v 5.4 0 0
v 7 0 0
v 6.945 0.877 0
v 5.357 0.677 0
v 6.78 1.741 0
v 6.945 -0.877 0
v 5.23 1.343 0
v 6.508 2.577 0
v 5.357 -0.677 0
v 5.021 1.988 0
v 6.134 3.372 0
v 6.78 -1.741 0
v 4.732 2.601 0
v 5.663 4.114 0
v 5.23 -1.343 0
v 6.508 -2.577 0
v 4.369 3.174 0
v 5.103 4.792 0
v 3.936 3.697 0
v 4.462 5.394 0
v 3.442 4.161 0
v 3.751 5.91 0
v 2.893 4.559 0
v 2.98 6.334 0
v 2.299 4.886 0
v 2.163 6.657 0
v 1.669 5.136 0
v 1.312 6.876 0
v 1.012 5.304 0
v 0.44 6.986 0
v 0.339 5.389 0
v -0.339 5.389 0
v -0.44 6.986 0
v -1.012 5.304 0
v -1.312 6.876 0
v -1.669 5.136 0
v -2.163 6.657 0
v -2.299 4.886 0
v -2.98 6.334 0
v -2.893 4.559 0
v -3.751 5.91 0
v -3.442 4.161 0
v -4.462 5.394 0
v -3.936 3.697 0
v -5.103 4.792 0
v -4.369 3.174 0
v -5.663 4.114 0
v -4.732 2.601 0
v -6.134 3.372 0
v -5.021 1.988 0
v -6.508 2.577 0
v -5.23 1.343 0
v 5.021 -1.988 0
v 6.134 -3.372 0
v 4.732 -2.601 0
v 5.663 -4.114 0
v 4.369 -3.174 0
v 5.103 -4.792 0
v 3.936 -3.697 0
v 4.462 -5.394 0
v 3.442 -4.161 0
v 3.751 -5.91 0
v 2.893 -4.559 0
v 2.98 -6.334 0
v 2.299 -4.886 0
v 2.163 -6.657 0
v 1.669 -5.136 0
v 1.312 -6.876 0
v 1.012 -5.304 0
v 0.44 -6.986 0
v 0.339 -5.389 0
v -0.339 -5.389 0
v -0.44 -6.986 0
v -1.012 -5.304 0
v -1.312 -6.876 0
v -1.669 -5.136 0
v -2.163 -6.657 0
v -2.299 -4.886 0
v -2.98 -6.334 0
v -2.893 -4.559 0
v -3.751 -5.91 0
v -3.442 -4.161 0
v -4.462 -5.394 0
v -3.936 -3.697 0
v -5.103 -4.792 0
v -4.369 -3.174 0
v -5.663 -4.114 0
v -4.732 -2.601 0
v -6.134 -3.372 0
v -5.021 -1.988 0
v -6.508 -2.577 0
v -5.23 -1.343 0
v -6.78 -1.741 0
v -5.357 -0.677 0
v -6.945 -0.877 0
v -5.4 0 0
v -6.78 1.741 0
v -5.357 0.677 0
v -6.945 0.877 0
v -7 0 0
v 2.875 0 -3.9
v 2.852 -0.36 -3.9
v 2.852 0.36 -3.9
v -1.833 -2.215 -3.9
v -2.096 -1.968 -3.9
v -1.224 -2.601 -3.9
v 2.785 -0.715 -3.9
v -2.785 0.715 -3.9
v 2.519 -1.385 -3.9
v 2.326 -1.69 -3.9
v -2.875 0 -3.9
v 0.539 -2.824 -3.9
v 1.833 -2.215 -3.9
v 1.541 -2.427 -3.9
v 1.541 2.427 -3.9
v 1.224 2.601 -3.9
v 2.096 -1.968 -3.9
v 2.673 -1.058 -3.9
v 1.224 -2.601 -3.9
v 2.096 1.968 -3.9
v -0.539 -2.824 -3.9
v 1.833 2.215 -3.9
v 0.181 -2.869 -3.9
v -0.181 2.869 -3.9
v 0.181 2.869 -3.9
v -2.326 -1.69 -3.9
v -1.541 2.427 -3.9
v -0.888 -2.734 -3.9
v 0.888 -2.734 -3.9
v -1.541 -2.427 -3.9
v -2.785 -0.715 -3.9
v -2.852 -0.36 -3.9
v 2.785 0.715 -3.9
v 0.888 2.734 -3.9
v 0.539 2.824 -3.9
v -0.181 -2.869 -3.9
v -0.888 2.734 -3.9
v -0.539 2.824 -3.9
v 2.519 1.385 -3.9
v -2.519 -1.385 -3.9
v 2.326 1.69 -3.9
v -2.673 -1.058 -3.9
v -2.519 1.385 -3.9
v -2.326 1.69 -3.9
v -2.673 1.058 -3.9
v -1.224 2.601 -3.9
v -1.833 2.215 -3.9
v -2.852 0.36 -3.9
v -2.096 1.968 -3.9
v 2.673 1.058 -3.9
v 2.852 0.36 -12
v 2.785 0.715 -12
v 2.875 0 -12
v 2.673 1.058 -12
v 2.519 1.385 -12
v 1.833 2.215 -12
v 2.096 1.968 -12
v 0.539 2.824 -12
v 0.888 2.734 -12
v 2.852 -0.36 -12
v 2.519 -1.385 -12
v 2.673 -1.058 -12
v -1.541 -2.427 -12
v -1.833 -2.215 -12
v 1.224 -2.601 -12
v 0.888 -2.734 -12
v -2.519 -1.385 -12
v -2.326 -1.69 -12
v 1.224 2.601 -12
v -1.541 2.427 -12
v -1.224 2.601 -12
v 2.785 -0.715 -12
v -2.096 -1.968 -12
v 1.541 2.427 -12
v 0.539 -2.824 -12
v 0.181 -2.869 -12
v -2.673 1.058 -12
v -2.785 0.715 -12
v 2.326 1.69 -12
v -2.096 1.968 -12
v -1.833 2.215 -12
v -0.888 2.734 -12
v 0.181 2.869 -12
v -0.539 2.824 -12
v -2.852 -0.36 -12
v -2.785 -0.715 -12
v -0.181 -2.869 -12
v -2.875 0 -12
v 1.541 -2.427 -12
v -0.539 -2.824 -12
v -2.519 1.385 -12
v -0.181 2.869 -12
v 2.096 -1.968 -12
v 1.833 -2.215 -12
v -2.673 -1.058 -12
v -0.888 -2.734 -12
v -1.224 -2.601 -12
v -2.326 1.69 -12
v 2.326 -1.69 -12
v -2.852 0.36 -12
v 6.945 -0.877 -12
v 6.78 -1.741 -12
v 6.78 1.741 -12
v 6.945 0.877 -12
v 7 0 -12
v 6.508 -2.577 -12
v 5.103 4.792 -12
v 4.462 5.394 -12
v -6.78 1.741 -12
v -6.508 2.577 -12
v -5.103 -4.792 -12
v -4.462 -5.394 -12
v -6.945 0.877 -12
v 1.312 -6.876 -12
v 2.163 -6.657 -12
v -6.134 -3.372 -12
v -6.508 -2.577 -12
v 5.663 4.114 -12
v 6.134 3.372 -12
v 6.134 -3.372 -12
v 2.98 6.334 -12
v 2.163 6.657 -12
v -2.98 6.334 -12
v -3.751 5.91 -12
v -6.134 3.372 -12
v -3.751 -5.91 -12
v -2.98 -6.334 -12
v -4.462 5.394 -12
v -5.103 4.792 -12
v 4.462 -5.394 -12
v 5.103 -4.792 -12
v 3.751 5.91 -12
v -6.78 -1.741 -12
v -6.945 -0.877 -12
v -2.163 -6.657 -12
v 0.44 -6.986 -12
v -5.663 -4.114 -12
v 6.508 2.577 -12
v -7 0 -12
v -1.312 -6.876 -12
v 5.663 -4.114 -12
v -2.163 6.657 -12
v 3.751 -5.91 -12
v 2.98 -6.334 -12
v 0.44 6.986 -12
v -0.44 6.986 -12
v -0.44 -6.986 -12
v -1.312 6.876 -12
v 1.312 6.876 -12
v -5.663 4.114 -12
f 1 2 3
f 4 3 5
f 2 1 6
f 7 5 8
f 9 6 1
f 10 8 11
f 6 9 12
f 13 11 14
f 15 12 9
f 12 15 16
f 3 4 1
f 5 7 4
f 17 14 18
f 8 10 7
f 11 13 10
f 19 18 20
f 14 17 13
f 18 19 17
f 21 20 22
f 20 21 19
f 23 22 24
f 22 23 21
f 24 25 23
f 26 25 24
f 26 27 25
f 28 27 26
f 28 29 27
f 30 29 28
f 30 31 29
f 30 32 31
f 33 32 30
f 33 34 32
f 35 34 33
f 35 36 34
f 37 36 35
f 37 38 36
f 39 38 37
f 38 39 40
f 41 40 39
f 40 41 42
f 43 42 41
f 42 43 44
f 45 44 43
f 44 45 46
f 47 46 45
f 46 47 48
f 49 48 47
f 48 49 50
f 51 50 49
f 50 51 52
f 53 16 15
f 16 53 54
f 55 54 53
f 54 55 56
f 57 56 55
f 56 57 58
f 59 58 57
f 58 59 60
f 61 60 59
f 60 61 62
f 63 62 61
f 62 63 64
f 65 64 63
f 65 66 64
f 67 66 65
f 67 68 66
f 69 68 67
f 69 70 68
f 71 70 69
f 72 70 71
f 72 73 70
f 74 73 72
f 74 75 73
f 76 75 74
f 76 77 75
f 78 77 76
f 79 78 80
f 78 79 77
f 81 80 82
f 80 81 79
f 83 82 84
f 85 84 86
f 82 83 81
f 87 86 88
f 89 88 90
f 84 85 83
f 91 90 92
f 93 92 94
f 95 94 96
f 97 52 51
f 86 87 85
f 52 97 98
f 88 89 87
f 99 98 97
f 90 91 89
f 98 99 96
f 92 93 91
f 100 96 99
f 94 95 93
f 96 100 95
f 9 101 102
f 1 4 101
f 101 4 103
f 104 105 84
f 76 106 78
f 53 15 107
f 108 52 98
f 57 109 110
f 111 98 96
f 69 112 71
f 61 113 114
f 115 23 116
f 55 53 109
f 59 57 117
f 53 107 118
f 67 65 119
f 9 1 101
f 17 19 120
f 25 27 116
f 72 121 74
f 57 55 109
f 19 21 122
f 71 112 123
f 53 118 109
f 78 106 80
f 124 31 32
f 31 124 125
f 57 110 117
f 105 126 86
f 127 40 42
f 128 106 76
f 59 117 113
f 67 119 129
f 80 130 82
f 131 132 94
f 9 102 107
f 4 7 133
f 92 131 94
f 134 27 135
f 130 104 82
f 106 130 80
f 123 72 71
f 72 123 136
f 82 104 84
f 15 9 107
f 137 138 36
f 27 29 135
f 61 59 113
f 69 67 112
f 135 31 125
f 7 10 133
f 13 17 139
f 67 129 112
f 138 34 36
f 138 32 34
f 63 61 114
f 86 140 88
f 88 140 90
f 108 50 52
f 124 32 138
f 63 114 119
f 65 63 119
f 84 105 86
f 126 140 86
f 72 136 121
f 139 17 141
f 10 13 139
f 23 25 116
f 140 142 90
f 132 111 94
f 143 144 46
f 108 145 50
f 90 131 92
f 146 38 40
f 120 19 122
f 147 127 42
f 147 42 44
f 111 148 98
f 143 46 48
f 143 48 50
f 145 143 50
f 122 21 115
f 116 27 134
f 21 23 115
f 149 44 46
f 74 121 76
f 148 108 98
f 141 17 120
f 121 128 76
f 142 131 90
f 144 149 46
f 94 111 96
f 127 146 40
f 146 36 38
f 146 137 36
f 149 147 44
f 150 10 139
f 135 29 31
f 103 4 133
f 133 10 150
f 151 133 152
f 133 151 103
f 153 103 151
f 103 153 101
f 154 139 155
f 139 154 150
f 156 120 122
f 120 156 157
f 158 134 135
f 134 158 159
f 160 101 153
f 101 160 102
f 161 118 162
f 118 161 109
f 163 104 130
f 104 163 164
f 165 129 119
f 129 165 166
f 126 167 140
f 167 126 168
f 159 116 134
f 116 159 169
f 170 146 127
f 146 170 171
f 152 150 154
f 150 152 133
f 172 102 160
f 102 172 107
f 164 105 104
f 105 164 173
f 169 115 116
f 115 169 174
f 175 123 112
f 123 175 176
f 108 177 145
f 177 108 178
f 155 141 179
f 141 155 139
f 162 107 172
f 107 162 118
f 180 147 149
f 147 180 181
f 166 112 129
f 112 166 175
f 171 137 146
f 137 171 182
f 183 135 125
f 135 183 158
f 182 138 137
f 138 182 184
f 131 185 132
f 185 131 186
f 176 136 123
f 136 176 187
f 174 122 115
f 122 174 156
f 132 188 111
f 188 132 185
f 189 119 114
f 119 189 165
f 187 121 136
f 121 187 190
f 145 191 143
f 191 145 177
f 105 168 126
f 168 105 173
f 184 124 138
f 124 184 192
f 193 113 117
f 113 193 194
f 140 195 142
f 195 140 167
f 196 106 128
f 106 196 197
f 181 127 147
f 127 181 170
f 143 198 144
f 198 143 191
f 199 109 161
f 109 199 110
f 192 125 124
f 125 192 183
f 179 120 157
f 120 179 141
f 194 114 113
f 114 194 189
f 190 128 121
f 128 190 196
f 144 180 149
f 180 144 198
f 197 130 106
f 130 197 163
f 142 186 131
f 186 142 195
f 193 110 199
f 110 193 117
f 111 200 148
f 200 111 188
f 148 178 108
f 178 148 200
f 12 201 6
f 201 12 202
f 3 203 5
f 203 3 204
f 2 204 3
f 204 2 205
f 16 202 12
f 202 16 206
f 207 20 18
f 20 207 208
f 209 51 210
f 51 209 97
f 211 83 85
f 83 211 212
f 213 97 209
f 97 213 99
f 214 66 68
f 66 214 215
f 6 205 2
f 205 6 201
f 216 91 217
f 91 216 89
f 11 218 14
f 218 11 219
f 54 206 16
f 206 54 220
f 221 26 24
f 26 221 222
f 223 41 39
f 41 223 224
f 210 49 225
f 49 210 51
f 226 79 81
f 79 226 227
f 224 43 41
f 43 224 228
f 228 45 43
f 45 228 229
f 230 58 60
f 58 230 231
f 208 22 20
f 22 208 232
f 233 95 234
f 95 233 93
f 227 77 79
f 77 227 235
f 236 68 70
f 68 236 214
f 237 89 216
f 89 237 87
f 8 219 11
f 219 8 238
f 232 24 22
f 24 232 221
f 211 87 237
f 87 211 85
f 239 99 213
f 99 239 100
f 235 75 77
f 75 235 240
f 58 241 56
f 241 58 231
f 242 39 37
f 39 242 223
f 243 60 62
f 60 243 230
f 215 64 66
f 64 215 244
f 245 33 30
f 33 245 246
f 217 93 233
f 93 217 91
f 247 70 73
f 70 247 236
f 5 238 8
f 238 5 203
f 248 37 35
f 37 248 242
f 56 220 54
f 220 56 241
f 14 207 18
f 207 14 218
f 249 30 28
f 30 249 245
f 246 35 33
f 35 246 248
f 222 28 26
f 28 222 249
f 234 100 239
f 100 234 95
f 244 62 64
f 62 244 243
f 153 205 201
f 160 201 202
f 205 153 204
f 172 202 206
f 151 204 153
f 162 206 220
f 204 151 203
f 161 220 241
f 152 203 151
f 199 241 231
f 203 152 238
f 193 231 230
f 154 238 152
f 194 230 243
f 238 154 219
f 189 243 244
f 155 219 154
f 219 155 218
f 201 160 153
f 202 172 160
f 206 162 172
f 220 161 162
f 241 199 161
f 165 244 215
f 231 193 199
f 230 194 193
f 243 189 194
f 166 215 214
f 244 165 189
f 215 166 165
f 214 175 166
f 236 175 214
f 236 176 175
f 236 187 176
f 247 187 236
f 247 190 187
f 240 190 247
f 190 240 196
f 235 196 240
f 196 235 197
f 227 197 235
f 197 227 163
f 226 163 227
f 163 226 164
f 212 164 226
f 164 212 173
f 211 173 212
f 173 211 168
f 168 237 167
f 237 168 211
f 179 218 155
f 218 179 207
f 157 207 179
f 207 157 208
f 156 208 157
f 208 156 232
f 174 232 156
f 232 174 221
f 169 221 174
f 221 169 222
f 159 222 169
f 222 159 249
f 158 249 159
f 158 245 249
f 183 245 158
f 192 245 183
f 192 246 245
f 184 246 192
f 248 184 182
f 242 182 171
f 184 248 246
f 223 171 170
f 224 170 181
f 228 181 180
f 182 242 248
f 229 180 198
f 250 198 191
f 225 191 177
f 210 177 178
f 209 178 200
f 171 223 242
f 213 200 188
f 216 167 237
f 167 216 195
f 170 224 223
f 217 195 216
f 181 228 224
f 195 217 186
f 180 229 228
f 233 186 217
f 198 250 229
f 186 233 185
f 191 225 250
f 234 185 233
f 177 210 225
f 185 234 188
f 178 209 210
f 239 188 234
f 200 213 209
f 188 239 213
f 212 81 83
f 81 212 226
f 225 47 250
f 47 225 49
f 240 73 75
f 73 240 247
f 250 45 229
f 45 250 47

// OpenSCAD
$fn = 50;

difference() {
	union() {
		translate(v = [0, 0, -12.0]) {
			cylinder(h = 12, r = 7.0);
		}
	}
	union() {
		translate(v = [0, 0, 0]) {
			rotate(a = [0, 0, 0]) {
				difference() {
					union() {
						translate(v = [0, 0, -15.0]) {
							cylinder(h = 15, r = 2.6);
						}
						translate(v = [0, 0, -3.9]) {
							cylinder(h = 3.9, r1 = 2.875, r2 = 5.4);
						}
						translate(v = [0, 0, -15.0]) {
							cylinder(h = 15, r = 2.875);
						}
						translate(v = [0, 0, -15.0]) {
							cylinder(h = 15, r = 2.6);
						}
					}
					union();
				}
			}
		}
	}
}
